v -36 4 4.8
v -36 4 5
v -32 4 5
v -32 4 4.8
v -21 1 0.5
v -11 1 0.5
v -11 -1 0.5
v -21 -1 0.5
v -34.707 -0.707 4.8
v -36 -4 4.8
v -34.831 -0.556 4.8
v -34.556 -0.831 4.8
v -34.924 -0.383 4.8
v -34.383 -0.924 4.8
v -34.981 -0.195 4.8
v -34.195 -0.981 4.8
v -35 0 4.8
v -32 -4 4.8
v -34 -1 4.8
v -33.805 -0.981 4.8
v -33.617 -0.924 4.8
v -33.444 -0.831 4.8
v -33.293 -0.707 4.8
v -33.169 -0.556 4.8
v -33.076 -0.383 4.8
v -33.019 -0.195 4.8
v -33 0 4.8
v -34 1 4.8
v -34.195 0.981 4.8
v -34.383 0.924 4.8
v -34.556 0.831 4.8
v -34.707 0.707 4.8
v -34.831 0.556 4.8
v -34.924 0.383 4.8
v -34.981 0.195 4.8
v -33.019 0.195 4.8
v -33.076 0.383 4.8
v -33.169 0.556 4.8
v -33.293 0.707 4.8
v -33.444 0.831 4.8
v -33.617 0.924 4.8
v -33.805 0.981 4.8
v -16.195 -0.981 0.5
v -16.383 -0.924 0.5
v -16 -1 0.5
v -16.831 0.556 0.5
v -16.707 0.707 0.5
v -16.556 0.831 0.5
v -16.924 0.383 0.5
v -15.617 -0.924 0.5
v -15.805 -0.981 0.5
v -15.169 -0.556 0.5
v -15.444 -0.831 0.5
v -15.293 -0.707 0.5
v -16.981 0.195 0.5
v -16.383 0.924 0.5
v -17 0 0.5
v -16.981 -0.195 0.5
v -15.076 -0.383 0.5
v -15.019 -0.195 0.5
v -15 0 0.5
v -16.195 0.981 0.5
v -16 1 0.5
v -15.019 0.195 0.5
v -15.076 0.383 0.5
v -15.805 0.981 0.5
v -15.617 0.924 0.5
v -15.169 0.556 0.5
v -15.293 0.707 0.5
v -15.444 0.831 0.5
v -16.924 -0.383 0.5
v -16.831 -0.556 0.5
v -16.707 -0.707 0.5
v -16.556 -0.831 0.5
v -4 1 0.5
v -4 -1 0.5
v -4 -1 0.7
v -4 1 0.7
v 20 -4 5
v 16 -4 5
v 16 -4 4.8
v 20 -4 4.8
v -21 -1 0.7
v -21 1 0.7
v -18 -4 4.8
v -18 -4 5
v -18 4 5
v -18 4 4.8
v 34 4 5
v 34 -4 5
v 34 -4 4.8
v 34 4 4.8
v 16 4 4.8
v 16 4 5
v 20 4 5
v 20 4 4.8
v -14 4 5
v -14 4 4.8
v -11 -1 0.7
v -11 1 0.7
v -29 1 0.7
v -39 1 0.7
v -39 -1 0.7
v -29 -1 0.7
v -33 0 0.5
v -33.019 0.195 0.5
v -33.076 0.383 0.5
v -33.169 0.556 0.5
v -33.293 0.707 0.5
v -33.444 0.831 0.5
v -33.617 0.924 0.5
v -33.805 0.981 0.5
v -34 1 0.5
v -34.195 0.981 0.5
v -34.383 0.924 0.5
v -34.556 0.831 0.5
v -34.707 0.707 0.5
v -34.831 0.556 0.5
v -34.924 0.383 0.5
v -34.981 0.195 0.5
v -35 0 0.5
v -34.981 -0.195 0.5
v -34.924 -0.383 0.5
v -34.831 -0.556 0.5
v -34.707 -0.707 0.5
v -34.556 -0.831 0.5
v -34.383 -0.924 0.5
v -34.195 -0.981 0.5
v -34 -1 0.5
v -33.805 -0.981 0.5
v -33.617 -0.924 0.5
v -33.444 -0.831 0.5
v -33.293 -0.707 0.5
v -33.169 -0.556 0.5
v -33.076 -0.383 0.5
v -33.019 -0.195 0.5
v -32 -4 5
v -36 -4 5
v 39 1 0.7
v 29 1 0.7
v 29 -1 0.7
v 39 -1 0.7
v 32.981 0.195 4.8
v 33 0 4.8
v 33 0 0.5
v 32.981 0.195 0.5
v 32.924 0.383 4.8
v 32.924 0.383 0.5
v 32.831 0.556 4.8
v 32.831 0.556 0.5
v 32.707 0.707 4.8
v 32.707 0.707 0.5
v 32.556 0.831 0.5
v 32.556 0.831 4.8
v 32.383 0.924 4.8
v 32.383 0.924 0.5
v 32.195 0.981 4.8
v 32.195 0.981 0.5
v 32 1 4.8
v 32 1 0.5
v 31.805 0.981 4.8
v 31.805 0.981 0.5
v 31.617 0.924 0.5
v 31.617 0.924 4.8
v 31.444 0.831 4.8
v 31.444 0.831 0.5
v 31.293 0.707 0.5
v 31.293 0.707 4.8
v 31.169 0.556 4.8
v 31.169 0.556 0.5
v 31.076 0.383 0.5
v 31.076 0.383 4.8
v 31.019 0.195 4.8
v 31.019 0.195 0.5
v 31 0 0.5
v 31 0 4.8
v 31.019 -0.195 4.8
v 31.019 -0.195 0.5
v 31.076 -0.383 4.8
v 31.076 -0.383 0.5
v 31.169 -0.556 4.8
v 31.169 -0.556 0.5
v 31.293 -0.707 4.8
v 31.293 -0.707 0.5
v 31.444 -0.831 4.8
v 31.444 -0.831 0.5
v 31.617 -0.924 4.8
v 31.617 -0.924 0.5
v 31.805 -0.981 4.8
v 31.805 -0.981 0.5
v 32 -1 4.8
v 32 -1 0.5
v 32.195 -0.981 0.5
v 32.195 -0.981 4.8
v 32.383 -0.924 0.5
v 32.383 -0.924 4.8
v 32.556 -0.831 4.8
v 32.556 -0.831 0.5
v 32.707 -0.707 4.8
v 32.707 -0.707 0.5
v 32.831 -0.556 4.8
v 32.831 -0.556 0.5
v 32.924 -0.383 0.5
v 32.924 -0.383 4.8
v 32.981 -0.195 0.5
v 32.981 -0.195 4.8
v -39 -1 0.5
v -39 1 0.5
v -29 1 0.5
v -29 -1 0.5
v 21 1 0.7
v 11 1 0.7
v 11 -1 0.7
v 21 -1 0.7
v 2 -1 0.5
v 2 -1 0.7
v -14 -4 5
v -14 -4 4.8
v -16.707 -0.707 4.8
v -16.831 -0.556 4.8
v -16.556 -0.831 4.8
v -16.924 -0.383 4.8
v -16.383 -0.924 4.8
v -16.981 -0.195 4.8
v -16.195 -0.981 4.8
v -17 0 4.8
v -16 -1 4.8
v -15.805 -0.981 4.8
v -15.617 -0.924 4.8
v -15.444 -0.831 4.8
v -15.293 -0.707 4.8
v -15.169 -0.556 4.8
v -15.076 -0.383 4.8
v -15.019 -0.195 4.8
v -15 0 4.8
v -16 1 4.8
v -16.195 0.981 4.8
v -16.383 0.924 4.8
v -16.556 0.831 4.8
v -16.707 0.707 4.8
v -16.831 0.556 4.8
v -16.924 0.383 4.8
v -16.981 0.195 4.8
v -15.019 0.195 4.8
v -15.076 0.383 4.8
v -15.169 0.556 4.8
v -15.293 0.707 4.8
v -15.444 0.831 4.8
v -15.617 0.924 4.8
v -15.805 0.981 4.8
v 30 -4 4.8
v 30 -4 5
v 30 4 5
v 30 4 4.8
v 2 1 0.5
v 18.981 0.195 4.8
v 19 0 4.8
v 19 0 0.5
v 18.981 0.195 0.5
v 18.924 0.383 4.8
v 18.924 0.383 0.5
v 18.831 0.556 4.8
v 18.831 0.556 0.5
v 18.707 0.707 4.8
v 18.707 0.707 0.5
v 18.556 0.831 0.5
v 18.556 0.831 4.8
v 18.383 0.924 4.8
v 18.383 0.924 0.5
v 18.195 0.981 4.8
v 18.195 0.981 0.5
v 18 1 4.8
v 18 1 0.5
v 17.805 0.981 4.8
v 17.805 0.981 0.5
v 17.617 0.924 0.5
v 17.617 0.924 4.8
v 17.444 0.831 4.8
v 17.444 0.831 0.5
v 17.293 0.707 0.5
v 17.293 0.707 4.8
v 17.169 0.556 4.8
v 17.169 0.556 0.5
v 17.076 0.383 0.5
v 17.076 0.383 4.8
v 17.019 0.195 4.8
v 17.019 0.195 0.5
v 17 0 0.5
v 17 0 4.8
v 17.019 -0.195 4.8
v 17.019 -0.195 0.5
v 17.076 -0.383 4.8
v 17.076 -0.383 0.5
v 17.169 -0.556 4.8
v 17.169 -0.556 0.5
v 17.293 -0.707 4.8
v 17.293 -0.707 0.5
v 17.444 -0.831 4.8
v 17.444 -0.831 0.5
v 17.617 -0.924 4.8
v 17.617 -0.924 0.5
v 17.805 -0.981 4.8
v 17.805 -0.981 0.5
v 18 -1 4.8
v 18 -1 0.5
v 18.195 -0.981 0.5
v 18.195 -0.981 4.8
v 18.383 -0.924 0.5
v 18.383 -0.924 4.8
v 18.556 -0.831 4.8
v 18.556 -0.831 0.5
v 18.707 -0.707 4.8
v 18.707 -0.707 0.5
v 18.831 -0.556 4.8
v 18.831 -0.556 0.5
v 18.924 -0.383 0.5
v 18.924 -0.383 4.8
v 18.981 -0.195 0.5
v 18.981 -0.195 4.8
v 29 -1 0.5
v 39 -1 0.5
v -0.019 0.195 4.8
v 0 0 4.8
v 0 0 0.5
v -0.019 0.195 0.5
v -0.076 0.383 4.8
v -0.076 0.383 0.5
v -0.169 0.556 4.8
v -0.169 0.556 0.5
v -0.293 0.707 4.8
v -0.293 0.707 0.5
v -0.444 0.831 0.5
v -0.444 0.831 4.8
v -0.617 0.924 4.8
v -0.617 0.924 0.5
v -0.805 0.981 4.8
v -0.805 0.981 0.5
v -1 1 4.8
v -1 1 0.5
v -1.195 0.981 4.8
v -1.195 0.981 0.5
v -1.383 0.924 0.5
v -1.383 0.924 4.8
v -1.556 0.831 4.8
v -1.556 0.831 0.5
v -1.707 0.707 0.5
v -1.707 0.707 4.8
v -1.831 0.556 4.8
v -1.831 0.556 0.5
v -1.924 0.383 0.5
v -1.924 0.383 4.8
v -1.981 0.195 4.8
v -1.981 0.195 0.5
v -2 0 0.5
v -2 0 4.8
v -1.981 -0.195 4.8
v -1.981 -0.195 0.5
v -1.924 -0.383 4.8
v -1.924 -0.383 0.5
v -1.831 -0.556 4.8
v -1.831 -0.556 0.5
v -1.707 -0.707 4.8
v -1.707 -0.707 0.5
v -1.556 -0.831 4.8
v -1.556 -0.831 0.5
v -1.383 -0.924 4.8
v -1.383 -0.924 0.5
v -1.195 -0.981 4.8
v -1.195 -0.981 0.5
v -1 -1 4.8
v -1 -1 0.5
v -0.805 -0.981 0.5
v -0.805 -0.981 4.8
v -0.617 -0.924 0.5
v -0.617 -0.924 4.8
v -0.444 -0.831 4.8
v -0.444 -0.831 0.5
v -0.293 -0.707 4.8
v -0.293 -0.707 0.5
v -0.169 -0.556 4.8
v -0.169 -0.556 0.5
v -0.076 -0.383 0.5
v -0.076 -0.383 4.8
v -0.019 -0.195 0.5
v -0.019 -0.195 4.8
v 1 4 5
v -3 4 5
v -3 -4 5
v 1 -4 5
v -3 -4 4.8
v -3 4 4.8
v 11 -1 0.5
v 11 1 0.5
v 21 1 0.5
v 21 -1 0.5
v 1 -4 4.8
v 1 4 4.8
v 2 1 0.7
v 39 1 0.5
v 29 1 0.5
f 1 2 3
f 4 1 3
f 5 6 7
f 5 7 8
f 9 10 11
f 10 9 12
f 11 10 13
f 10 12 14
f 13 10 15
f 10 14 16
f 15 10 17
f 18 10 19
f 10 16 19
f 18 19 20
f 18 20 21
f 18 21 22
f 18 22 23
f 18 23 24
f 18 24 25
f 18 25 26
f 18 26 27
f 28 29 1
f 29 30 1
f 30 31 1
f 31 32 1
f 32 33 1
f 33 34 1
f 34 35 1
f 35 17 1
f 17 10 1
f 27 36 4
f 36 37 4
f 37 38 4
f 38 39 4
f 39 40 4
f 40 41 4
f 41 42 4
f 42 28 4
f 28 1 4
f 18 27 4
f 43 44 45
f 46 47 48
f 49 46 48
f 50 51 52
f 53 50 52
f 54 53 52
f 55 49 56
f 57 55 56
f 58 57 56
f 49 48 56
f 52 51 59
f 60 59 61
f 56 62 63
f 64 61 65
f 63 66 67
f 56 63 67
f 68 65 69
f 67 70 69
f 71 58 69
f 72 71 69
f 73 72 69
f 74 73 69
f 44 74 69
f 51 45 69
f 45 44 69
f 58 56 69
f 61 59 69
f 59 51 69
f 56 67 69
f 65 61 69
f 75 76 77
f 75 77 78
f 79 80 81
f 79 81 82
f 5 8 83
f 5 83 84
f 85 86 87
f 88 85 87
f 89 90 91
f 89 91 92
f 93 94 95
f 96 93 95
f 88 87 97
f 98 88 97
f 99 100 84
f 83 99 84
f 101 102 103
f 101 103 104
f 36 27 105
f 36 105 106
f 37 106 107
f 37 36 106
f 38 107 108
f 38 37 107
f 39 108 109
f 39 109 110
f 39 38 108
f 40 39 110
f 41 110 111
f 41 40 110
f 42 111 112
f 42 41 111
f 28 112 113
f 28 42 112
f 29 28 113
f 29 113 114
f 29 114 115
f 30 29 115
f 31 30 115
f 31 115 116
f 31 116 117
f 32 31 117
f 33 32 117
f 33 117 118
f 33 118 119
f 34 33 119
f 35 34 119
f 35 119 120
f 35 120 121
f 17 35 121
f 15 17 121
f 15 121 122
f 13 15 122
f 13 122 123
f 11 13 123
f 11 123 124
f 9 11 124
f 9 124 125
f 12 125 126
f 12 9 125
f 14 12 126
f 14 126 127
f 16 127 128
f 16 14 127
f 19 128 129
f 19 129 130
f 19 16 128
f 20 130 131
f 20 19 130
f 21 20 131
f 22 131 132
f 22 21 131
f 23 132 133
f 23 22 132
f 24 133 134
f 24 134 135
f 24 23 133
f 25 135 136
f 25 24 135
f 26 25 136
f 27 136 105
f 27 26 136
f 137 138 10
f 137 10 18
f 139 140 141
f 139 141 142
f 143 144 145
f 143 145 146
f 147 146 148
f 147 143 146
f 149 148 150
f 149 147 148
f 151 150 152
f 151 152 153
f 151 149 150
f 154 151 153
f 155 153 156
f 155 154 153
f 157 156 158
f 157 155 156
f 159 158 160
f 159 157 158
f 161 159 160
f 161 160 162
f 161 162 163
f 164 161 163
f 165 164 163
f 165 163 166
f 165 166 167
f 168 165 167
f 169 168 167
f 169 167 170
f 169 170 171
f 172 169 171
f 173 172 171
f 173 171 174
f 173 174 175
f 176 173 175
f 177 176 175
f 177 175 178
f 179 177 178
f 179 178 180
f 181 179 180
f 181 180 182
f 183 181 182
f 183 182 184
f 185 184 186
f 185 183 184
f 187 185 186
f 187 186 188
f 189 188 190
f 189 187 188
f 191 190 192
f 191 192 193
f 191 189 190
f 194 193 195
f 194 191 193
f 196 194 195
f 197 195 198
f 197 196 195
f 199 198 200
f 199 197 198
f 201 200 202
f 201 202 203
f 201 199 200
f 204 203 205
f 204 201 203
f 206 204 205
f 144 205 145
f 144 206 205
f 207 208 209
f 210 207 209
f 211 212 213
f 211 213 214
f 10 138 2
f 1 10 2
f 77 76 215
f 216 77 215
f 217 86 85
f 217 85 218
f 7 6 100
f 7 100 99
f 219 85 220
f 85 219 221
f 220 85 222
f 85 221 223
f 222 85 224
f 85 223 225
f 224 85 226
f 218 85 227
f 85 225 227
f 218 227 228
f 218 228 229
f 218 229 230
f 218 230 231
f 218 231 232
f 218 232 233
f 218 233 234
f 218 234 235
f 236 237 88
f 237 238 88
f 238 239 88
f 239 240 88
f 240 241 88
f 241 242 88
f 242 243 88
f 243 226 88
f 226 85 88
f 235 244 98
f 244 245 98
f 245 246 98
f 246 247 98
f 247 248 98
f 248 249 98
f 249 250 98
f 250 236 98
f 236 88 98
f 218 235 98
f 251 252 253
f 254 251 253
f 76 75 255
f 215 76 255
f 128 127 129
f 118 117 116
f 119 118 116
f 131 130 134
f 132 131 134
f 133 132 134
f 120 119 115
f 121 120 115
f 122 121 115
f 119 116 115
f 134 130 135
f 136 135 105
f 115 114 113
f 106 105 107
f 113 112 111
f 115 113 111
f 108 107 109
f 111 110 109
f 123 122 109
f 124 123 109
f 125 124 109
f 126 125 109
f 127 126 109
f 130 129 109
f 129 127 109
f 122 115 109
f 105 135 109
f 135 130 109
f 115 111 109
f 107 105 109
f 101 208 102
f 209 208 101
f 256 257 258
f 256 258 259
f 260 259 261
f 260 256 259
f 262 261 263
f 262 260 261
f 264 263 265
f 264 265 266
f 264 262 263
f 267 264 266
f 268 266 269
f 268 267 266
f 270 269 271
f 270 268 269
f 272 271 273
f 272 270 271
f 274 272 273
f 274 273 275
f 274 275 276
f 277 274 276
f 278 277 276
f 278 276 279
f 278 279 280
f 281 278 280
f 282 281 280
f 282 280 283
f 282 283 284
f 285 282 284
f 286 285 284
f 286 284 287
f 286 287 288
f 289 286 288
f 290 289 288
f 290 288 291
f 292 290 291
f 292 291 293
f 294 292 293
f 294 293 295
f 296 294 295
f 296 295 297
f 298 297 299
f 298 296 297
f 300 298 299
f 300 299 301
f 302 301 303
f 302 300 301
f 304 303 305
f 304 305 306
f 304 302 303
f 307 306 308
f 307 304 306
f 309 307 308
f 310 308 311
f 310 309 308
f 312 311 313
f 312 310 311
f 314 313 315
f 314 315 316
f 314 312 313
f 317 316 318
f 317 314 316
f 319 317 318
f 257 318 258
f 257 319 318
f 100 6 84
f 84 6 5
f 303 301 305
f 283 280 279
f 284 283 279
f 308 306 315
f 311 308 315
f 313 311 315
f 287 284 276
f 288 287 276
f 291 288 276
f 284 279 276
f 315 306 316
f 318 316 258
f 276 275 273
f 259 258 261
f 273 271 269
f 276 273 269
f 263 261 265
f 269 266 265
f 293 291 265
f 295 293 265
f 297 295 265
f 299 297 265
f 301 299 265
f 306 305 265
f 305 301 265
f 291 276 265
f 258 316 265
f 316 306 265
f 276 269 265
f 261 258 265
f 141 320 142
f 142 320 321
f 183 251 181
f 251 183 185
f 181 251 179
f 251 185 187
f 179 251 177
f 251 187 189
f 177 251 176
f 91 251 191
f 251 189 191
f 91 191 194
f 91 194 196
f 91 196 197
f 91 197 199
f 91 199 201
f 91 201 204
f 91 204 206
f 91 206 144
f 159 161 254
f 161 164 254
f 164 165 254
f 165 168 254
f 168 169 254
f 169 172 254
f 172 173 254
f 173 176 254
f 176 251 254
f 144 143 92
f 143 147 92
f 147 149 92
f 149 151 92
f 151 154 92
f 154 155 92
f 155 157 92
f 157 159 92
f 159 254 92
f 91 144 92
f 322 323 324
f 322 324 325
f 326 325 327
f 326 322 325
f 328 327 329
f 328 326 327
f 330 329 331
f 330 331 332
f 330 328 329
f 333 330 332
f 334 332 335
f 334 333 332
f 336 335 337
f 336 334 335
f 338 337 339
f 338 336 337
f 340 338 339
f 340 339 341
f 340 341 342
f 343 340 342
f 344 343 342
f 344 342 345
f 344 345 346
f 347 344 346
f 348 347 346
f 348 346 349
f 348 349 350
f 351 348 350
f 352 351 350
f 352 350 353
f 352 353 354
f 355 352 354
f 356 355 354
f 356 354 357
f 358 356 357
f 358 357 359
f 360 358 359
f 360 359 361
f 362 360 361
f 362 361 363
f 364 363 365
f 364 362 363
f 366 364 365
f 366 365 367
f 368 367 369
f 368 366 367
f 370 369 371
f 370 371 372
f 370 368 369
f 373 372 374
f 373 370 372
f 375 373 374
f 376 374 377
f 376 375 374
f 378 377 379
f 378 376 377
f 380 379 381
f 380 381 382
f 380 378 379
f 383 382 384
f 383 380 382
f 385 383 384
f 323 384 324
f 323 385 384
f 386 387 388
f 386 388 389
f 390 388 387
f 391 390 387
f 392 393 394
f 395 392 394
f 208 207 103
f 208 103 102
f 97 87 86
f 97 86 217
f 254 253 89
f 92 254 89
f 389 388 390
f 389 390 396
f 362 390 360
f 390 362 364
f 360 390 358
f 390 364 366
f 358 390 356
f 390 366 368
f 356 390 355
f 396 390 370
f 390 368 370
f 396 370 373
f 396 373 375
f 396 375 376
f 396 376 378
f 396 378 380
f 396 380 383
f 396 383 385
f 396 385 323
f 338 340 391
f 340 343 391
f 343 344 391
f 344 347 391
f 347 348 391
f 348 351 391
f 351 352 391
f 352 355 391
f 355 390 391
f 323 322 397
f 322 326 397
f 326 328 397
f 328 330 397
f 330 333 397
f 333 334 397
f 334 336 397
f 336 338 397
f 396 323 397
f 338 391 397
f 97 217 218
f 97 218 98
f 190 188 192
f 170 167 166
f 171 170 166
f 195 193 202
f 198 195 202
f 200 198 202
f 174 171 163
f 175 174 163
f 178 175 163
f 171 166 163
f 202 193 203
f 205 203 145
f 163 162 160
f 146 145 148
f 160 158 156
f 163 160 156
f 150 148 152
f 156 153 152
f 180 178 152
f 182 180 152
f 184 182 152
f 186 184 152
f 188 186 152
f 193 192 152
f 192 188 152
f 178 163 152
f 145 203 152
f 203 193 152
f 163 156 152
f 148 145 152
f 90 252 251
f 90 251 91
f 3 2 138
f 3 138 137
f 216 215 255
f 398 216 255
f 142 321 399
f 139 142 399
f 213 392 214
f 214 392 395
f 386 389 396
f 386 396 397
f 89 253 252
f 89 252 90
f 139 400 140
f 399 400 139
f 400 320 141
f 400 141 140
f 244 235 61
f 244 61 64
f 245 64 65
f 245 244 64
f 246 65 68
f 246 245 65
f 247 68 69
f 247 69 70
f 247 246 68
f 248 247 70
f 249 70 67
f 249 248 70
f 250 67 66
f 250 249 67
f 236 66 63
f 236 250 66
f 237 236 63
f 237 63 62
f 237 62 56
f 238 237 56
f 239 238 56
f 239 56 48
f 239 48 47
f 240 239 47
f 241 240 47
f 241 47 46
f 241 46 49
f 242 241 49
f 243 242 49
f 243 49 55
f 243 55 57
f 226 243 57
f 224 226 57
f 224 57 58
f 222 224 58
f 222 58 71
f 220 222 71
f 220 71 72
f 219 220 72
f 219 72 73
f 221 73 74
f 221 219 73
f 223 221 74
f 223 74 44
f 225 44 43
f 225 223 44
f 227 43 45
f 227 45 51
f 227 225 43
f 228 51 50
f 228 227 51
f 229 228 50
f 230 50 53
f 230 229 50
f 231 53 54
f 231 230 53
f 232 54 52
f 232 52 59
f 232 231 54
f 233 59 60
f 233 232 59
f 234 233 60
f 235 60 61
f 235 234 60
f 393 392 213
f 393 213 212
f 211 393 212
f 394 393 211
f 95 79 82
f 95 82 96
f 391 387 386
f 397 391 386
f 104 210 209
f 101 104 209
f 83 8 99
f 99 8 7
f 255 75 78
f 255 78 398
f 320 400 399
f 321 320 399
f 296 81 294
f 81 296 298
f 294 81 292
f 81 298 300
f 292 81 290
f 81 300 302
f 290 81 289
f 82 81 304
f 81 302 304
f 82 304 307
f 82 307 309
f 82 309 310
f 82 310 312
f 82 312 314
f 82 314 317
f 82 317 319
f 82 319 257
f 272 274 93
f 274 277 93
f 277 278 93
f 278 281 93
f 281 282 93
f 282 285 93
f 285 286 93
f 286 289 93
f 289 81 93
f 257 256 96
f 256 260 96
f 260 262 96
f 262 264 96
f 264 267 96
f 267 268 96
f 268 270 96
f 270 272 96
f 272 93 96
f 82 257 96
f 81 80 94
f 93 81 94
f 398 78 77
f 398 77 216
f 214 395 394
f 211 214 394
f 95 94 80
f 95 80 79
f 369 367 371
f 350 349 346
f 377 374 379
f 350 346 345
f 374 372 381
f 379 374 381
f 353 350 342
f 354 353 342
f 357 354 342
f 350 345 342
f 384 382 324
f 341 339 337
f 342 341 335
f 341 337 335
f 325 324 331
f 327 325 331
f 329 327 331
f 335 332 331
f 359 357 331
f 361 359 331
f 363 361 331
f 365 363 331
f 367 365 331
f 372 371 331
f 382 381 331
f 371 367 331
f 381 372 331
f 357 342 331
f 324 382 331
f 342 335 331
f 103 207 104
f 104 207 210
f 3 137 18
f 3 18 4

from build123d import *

# Parameters (mm, degrees)
BOSS_EXTRUDE1_DEPTH   = 0.2
SKETCH8_W             = 10
SKETCH8_H             = 2
BOSS_EXTRUDE1_2_DEPTH = 0.2
SKETCH8_W_2           = 6
BOSS_EXTRUDE1_3_DEPTH = 0.2
BOSS_EXTRUDE1_4_DEPTH = 0.2
BOSS_EXTRUDE1_5_DEPTH = 0.2
SKETCH10_R            = 1
BOSS_EXTRUDE2_DEPTH   = 4.5
BOSS_EXTRUDE2_2_DEPTH = 4.5
BOSS_EXTRUDE2_3_DEPTH = 4.5
BOSS_EXTRUDE2_4_DEPTH = 4.5
BOSS_EXTRUDE2_5_DEPTH = 4.5
SKETCH11_W            = 4
SKETCH11_H            = 8
BOSS_EXTRUDE3_DEPTH   = 0.2


with BuildPart() as part:
    # Sketch8 → Boss-Extrude1 (new body)
    with BuildSketch(Plane.XY.offset(0.5)):
        Polygon((-21, 1), (-17, 1), (-11, 1), (-11, -1), (-17, -1), (-21, -1), align=None)
    extrude(amount=BOSS_EXTRUDE1_DEPTH)


with BuildPart() as body_2:
    # Sketch8 → Boss-Extrude1 2 (new body)
    with BuildSketch(Plane.XY.offset(0.5)):
        with Locations((-34, 0)):
            Rectangle(SKETCH8_W, SKETCH8_H)
    extrude(amount=BOSS_EXTRUDE1_2_DEPTH)


with BuildPart() as body_3:
    # Sketch8 → Boss-Extrude1 3 (new body)
    with BuildSketch(Plane.XY.offset(0.5)):
        with Locations((-1, 0)):
            Rectangle(SKETCH8_W_2, SKETCH8_H)
    extrude(amount=BOSS_EXTRUDE1_3_DEPTH)


with BuildPart() as body_4:
    # Sketch8 → Boss-Extrude1 4 (new body)
    with BuildSketch(Plane.XY.offset(0.5)):
        with Locations((16, 0)):
            Rectangle(SKETCH8_W, SKETCH8_H)
    extrude(amount=BOSS_EXTRUDE1_4_DEPTH)


with BuildPart() as body_5:
    # Sketch8 → Boss-Extrude1 5 (new body)
    with BuildSketch(Plane.XY.offset(0.5)):
        with Locations((34, 0)):
            Rectangle(SKETCH8_W, SKETCH8_H)
    extrude(amount=BOSS_EXTRUDE1_5_DEPTH)


with BuildPart() as body_6:
    # Sketch10 → Boss-Extrude2 (new body)
    with BuildSketch(Plane.XY.offset(5)):
        with Locations((-34, 0)):
            Circle(SKETCH10_R)
    extrude(amount=-BOSS_EXTRUDE2_DEPTH)



with BuildPart() as body_7:
    # Sketch10 → Boss-Extrude2 2 (new body)
    with BuildSketch(Plane.XY.offset(5)):
        with Locations((-16, 0)):
            Circle(SKETCH10_R)
    extrude(amount=-BOSS_EXTRUDE2_2_DEPTH)


with BuildPart() as body_8:
    # Sketch10 → Boss-Extrude2 3 (new body)
    with BuildSketch(Plane.XY.offset(5)):
        with Locations((-1, 0)):
            Circle(SKETCH10_R)
    extrude(amount=-BOSS_EXTRUDE2_3_DEPTH)


with BuildPart() as body_9:
    # Sketch10 → Boss-Extrude2 4 (new body)
    with BuildSketch(Plane.XY.offset(5)):
        with Locations((18, 0)):
            Circle(SKETCH10_R)
    extrude(amount=-BOSS_EXTRUDE2_4_DEPTH)


with BuildPart() as body_10:
    # Sketch10 → Boss-Extrude2 5 (new body)
    with BuildSketch(Plane.XY.offset(5)):
        with Locations((32, 0)):
            Circle(SKETCH10_R)
    extrude(amount=-BOSS_EXTRUDE2_5_DEPTH)


with BuildPart() as body_6_1:
    add(body_6.part)

    add(body_7.part)  # Boss-Extrude3 merges body 7

    add(body_8.part)  # Boss-Extrude3 merges body 8

    add(body_9.part)  # Boss-Extrude3 merges body 9

    add(body_10.part)  # Boss-Extrude3 merges body 10
    # Sketch11 → Boss-Extrude3 (add)
    with BuildSketch(Plane.XY.offset(5)):
        with Locations((-34, 0)):
            Rectangle(SKETCH11_W, SKETCH11_H)
        with Locations((-16, 0)):
            Rectangle(SKETCH11_W, SKETCH11_H)
        with Locations((-1, 0)):
            Rectangle(SKETCH11_W, SKETCH11_H)
        with Locations((18, 0)):
            Rectangle(SKETCH11_W, SKETCH11_H)
        with Locations((32, 0)):
            Rectangle(SKETCH11_W, SKETCH11_H)
    extrude(amount=-BOSS_EXTRUDE3_DEPTH)


solid = Compound([part.part, body_2.part, body_3.part, body_4.part, body_5.part, body_6_1.part])
